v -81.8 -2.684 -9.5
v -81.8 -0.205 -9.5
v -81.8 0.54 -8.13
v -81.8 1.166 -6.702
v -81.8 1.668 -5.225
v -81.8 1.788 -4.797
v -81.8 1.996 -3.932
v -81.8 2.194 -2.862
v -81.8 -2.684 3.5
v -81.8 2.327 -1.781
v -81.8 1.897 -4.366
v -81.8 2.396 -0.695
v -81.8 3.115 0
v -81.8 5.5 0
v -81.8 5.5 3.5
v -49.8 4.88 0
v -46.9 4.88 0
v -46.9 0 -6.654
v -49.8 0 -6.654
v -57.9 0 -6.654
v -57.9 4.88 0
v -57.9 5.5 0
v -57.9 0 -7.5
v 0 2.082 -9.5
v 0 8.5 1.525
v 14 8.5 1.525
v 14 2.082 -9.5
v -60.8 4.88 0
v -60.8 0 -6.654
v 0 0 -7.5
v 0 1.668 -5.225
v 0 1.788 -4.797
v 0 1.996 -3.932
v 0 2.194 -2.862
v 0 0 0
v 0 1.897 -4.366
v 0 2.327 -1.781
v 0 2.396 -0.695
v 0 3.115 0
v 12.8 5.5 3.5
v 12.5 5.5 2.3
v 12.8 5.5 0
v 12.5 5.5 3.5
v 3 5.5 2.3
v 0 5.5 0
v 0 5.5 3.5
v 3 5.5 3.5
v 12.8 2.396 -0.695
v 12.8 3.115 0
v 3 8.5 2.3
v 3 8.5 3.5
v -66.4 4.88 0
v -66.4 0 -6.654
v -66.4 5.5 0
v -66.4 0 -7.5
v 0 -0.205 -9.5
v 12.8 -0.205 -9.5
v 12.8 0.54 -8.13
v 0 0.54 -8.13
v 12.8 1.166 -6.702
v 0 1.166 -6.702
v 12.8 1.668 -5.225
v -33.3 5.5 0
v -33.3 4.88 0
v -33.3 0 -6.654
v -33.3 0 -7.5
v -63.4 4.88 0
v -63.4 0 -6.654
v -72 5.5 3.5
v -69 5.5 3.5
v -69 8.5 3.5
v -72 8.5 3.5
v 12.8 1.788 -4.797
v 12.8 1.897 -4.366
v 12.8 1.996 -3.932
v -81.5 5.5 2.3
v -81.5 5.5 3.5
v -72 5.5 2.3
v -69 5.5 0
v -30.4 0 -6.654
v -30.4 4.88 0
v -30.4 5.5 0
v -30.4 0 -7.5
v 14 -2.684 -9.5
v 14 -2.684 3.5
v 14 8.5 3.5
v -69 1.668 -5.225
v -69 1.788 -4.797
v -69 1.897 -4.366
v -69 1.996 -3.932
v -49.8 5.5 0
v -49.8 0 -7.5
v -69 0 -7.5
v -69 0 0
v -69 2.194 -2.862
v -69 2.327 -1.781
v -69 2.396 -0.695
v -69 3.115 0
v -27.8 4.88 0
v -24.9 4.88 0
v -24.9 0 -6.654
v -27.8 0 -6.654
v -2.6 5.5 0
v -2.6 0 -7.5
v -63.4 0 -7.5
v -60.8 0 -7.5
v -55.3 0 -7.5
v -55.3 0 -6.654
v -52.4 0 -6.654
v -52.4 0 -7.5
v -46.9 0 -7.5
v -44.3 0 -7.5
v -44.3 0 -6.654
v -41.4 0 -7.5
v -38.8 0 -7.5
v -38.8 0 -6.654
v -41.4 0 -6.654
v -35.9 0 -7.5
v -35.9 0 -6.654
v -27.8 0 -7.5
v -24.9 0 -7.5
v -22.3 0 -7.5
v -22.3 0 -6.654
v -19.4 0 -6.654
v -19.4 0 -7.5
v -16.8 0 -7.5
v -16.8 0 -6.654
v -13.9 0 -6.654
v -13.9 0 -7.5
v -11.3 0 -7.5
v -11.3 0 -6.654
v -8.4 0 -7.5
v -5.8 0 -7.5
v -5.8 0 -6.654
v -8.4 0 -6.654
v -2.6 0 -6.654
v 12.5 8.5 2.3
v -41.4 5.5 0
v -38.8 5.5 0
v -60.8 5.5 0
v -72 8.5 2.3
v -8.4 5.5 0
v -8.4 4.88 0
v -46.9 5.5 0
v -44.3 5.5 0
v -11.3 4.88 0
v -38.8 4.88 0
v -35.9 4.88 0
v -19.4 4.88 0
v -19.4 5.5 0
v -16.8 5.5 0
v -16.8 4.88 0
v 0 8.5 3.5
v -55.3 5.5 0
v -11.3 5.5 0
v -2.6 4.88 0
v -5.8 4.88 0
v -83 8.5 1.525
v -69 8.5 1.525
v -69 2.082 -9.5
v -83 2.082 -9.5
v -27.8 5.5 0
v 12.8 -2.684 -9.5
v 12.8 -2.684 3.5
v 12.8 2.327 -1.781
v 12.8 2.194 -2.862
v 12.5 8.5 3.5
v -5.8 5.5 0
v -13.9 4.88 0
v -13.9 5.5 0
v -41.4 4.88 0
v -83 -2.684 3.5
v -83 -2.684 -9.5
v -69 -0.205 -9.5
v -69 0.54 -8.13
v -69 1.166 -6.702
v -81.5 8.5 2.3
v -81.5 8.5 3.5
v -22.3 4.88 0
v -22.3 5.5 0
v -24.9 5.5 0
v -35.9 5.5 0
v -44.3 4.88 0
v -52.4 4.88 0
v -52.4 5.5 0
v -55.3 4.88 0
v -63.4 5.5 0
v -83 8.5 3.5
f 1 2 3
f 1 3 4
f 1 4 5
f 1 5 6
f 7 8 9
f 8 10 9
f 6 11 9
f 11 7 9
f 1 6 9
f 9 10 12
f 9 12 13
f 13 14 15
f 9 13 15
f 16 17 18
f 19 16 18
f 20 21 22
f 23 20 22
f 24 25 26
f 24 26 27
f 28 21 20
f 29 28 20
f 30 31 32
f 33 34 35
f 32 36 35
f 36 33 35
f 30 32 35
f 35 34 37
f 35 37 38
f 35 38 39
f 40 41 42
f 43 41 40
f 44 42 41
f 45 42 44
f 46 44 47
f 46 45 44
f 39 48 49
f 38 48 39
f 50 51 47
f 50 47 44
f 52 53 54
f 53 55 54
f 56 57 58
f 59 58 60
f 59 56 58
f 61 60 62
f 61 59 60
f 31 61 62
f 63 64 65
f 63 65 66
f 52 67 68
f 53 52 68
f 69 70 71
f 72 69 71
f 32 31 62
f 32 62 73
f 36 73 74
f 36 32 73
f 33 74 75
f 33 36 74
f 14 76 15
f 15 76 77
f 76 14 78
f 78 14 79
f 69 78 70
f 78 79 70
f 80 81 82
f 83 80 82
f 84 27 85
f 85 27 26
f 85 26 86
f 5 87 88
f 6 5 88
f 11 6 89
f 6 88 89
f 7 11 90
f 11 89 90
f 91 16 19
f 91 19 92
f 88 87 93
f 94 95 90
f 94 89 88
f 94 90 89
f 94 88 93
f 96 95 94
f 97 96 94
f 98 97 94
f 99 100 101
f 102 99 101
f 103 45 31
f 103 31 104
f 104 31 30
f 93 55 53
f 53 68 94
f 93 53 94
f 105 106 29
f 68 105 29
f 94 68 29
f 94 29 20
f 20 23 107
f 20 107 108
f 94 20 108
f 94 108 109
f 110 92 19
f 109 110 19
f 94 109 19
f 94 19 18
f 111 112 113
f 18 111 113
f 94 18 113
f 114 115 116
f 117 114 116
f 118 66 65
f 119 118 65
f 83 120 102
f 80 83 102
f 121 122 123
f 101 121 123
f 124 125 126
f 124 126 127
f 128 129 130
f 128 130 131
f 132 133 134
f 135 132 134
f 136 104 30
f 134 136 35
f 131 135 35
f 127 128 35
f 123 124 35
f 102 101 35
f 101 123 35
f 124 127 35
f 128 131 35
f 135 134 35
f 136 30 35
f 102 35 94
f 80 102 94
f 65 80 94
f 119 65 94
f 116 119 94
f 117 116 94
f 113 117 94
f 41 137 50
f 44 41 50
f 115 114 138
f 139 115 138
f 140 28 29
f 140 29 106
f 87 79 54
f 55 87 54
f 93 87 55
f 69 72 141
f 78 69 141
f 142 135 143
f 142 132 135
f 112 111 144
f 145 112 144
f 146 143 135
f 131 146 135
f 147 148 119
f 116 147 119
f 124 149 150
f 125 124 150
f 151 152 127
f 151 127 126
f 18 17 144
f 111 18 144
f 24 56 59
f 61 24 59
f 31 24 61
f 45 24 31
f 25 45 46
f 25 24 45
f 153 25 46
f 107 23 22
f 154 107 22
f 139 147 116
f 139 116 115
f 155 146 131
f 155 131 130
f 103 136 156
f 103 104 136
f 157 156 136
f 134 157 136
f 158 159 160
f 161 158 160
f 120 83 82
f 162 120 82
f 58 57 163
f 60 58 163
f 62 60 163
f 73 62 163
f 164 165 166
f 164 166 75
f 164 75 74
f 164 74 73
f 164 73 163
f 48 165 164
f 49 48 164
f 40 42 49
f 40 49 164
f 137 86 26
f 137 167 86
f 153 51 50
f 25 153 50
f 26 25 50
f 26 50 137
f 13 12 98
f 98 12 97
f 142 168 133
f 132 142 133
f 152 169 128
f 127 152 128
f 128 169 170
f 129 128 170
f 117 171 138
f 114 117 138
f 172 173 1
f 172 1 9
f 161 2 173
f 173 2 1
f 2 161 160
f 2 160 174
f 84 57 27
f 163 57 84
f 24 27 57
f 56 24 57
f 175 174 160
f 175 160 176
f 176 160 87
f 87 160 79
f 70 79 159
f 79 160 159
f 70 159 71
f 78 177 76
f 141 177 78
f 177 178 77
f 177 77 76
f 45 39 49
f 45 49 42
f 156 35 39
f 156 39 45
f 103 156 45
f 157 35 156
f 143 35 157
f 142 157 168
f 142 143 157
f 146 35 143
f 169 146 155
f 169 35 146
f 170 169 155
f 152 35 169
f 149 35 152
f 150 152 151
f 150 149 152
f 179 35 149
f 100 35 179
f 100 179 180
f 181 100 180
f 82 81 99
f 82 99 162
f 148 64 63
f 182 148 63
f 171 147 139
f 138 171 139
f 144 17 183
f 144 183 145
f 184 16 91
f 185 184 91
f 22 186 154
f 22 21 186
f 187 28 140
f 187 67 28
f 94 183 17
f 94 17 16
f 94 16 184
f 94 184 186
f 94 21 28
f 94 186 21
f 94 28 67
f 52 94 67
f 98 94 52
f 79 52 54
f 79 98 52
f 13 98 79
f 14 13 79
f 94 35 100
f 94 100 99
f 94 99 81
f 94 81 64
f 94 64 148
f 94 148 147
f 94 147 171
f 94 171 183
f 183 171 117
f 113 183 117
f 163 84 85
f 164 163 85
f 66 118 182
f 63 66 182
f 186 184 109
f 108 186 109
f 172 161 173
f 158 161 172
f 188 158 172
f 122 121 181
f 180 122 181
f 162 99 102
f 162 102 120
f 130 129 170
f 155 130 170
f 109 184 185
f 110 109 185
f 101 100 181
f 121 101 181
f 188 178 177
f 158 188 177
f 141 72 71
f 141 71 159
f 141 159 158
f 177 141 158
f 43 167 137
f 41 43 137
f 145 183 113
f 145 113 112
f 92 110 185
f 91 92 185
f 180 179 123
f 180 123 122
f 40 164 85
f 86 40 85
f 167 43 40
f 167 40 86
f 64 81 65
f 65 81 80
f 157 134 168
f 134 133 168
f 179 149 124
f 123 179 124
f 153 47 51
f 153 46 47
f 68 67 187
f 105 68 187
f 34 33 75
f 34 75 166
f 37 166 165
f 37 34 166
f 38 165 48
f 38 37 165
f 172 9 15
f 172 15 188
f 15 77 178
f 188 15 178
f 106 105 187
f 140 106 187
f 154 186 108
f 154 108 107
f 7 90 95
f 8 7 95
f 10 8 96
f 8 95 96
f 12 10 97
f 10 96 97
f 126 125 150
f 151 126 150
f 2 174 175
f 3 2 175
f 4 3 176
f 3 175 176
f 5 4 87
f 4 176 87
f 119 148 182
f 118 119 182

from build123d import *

# Parameters (mm, degrees)
BOSS_EXTRUDE1_DEPTH    = 2.6
BOSS_EXTRUDE2_START    = -2.6
BOSS_EXTRUDE2_DEPTH    = 69
BOSS_EXTRUDE3_START    = 3.2
BOSS_EXTRUDE3_DEPTH    = 2.6
FILL_START             = -63.4
FILL_PATTERN1_DEPTH    = 2.6
FILL_START_2           = -57.9
FILL_PATTERN1_2_DEPTH  = 2.6
FILL_START_3           = -52.4
FILL_PATTERN1_3_DEPTH  = 2.6
FILL_START_4           = -46.9
FILL_PATTERN1_4_DEPTH  = 2.6
FILL_START_5           = -41.4
FILL_PATTERN1_5_DEPTH  = 2.6
FILL_START_6           = -35.9
FILL_PATTERN1_6_DEPTH  = 2.6
FILL_START_7           = -30.4
FILL_PATTERN1_7_DEPTH  = 2.6
FILL_START_8           = -24.9
FILL_PATTERN1_8_DEPTH  = 2.6
FILL_START_9           = -19.4
FILL_PATTERN1_9_DEPTH  = 2.6
FILL_START_10          = -13.9
FILL_PATTERN1_10_DEPTH = 2.6
BOSS_EXTRUDE4_DEPTH    = 14
BOSS_EXTRUDE5_DEPTH    = 1.2
SKETCH6_W              = 9.5
SKETCH6_H              = 1.2
CUT_EXTRUDE1_DEPTH     = 3
CHAMFER1_START         = -1
CHAMFER1_DEPTH         = 3.165267299


with BuildPart() as part:
    # Sketch2 → Boss-Extrude1 (new body)
    with BuildSketch(Plane(origin=(0, 0, 0), x_dir=(0, 0, -1), z_dir=(1, 0, 0))):
        Polygon((0, 0), (0, 5.5), (7.5, 0), align=None)
    boss_extrude1 = extrude(amount=-BOSS_EXTRUDE1_DEPTH)

    # Sketch3 → Boss-Extrude2 (add)
    with BuildSketch(Plane.ZY.offset(2.6).offset(BOSS_EXTRUDE2_START)):
        Polygon((0, 0), (0, 4.879964159), (-6.65449658, 0), align=None)
    extrude(amount=BOSS_EXTRUDE2_DEPTH)

    # Sketch3<3> → Boss-Extrude3 (add)
    with BuildSketch(Plane.ZY.offset(2.6).offset(BOSS_EXTRUDE3_START)):
        Polygon((-6.65449658, 0), (0, 4.879964159), (0, 5.5), (-7.5, 0), align=None)
    extrude(amount=BOSS_EXTRUDE3_DEPTH)

    # Mirror1: Boss-Extrude1 across plane
    add(boss_extrude1.mirror(Plane(origin=(-34.5, 0, 0), x_dir=(0, 0, 1), z_dir=(1, 0, 0))))

    # Fill Pattern1: read off the stored shape, not the designer's step
    # Fill Pattern1 outline → Fill Pattern1 (add)
    with BuildSketch(Plane.YZ.offset(FILL_START)):
        Polygon((4.879964159, 0), (0, -6.65449658), (0, -7.5), (5.5, 0), align=None)
    extrude(amount=FILL_PATTERN1_DEPTH)

    # Fill Pattern1 2 outline → Fill Pattern1 2 (add)
    with BuildSketch(Plane.YZ.offset(FILL_START_2)):
        Polygon((4.879964159, 0), (0, -6.65449658), (0, -7.5), (5.5, 0), align=None)
    extrude(amount=FILL_PATTERN1_2_DEPTH)

    # Fill Pattern1 3 outline → Fill Pattern1 3 (add)
    with BuildSketch(Plane.YZ.offset(FILL_START_3)):
        Polygon((4.879964159, 0), (0, -6.65449658), (0, -7.5), (5.5, 0), align=None)
    extrude(amount=FILL_PATTERN1_3_DEPTH)

    # Fill Pattern1 4 outline → Fill Pattern1 4 (add)
    with BuildSketch(Plane.YZ.offset(FILL_START_4)):
        Polygon((4.879964159, 0), (0, -6.65449658), (0, -7.5), (5.5, 0), align=None)
    extrude(amount=FILL_PATTERN1_4_DEPTH)

    # Fill Pattern1 5 outline → Fill Pattern1 5 (add)
    with BuildSketch(Plane.YZ.offset(FILL_START_5)):
        Polygon((4.879964159, 0), (0, -6.65449658), (0, -7.5), (5.5, 0), align=None)
    extrude(amount=FILL_PATTERN1_5_DEPTH)

    # Fill Pattern1 6 outline → Fill Pattern1 6 (add)
    with BuildSketch(Plane.YZ.offset(FILL_START_6)):
        Polygon((4.879964159, 0), (0, -6.65449658), (0, -7.5), (5.5, 0), align=None)
    extrude(amount=FILL_PATTERN1_6_DEPTH)

    # Fill Pattern1 7 outline → Fill Pattern1 7 (add)
    with BuildSketch(Plane.YZ.offset(FILL_START_7)):
        Polygon((4.879964159, 0), (0, -6.65449658), (0, -7.5), (5.5, 0), align=None)
    extrude(amount=FILL_PATTERN1_7_DEPTH)

    # Fill Pattern1 8 outline → Fill Pattern1 8 (add)
    with BuildSketch(Plane.YZ.offset(FILL_START_8)):
        Polygon((4.879964159, 0), (0, -6.65449658), (0, -7.5), (5.5, 0), align=None)
    extrude(amount=FILL_PATTERN1_8_DEPTH)

    # Fill Pattern1 9 outline → Fill Pattern1 9 (add)
    with BuildSketch(Plane.YZ.offset(FILL_START_9)):
        Polygon((4.879964159, 0), (0, -6.65449658), (0, -7.5), (5.5, 0), align=None)
    extrude(amount=FILL_PATTERN1_9_DEPTH)

    # Fill Pattern1 10 outline → Fill Pattern1 10 (add)
    with BuildSketch(Plane.YZ.offset(FILL_START_10)):
        Polygon((4.879964159, 0), (0, -6.65449658), (0, -7.5), (5.5, 0), align=None)
    extrude(amount=FILL_PATTERN1_10_DEPTH)

    # Sketch4 → Boss-Extrude4 (add)
    with BuildSketch(Plane.ZY.offset(69)):
        with BuildLine():
            Line((0, 2.406191741), (0, 4.879964159))
            Line((0, 4.879964159), (-3.932237623, 1.996323235))
            ThreePointArc((-3.932237623, 1.996323235), (-1.977221876, 2.307779179), (0, 2.406191741))
        make_face()
        with BuildLine():
            Line((0, 4.879964159), (0, 5.5))
            Line((0, 5.5), (-5.225299515, 1.668113689))
            ThreePointArc((-5.225299515, 1.668113689), (-4.581760916, 1.844007543), (-3.932237623, 1.996323235))
            Line((-3.932237623, 1.996323235), (0, 4.879964159))
        make_face()
        with BuildLine():
            Line((-5.225299515, 1.668113689), (0, 5.5))
            Line((0, 5.5), (3.5, 5.5))
            Line((3.5, 5.5), (3.5, 8.5))
            Line((3.5, 8.5), (1.525445934, 8.5))
            Line((1.525445934, 8.5), (-9.5, 2.081639323))
            Line((-9.5, 2.081639323), (-9.5, -0.204677967))
            ThreePointArc((-9.5, -0.204677967), (-7.422606569, 0.868570996), (-5.225299515, 1.668113689))
        make_face()
    boss_extrude4 = extrude(amount=BOSS_EXTRUDE4_DEPTH)

    # Sketch5 → Boss-Extrude5 (add)
    with BuildSketch(Plane.ZY.offset(83)):
        Polygon((3.5, 8.5), (1.525445934, 8.5), (-9.5, 2.081639323), (-9.5, -2.683513675), (3.5, -2.683513675), align=None)
    boss_extrude5 = extrude(amount=-BOSS_EXTRUDE5_DEPTH)

    # Sketch6 → Cut-Extrude1 (cut)
    with BuildSketch(Plane(origin=(0, 8.5, 0), x_dir=(1, 0, 0), z_dir=(0, 1, 0))):
        with Locations((-76.75, -2.9)):
            Rectangle(SKETCH6_W, SKETCH6_H)
    cut_extrude1 = extrude(amount=-CUT_EXTRUDE1_DEPTH, mode=Mode.SUBTRACT)

    # Chamfer1: read off the stored shape, not the designer's step
    # Chamfer1 outline → Chamfer1 (cut)
    with BuildSketch(Plane(origin=(0, 0, 0), x_dir=(1, 0, 0), z_dir=(0, 0.6951264470531402, -0.7188874895331522)).offset(CHAMFER1_START)):
        Polygon((-69, -1.239281183), (-81.8, -1.239281183), (-81.8, -2.239281185), (-69, -2.239281183), align=None)
    chamfer1 = extrude(amount=CHAMFER1_DEPTH, mode=Mode.SUBTRACT)

    # Mirror2: Boss-Extrude4, Boss-Extrude5, Cut-Extrude1, Chamfer1 across plane
    add(boss_extrude4.mirror(Plane(origin=(-34.5, 0, 0), x_dir=(0, 0, 1), z_dir=(1, 0, 0))))
    add(boss_extrude5.mirror(Plane(origin=(-34.5, 0, 0), x_dir=(0, 0, 1), z_dir=(1, 0, 0))))
    add(cut_extrude1.mirror(Plane(origin=(-34.5, 0, 0), x_dir=(0, 0, 1), z_dir=(1, 0, 0))), mode=Mode.SUBTRACT)
    add(chamfer1.mirror(Plane(origin=(-34.5, 0, 0), x_dir=(0, 0, 1), z_dir=(1, 0, 0))), mode=Mode.SUBTRACT)


solid = part.part
